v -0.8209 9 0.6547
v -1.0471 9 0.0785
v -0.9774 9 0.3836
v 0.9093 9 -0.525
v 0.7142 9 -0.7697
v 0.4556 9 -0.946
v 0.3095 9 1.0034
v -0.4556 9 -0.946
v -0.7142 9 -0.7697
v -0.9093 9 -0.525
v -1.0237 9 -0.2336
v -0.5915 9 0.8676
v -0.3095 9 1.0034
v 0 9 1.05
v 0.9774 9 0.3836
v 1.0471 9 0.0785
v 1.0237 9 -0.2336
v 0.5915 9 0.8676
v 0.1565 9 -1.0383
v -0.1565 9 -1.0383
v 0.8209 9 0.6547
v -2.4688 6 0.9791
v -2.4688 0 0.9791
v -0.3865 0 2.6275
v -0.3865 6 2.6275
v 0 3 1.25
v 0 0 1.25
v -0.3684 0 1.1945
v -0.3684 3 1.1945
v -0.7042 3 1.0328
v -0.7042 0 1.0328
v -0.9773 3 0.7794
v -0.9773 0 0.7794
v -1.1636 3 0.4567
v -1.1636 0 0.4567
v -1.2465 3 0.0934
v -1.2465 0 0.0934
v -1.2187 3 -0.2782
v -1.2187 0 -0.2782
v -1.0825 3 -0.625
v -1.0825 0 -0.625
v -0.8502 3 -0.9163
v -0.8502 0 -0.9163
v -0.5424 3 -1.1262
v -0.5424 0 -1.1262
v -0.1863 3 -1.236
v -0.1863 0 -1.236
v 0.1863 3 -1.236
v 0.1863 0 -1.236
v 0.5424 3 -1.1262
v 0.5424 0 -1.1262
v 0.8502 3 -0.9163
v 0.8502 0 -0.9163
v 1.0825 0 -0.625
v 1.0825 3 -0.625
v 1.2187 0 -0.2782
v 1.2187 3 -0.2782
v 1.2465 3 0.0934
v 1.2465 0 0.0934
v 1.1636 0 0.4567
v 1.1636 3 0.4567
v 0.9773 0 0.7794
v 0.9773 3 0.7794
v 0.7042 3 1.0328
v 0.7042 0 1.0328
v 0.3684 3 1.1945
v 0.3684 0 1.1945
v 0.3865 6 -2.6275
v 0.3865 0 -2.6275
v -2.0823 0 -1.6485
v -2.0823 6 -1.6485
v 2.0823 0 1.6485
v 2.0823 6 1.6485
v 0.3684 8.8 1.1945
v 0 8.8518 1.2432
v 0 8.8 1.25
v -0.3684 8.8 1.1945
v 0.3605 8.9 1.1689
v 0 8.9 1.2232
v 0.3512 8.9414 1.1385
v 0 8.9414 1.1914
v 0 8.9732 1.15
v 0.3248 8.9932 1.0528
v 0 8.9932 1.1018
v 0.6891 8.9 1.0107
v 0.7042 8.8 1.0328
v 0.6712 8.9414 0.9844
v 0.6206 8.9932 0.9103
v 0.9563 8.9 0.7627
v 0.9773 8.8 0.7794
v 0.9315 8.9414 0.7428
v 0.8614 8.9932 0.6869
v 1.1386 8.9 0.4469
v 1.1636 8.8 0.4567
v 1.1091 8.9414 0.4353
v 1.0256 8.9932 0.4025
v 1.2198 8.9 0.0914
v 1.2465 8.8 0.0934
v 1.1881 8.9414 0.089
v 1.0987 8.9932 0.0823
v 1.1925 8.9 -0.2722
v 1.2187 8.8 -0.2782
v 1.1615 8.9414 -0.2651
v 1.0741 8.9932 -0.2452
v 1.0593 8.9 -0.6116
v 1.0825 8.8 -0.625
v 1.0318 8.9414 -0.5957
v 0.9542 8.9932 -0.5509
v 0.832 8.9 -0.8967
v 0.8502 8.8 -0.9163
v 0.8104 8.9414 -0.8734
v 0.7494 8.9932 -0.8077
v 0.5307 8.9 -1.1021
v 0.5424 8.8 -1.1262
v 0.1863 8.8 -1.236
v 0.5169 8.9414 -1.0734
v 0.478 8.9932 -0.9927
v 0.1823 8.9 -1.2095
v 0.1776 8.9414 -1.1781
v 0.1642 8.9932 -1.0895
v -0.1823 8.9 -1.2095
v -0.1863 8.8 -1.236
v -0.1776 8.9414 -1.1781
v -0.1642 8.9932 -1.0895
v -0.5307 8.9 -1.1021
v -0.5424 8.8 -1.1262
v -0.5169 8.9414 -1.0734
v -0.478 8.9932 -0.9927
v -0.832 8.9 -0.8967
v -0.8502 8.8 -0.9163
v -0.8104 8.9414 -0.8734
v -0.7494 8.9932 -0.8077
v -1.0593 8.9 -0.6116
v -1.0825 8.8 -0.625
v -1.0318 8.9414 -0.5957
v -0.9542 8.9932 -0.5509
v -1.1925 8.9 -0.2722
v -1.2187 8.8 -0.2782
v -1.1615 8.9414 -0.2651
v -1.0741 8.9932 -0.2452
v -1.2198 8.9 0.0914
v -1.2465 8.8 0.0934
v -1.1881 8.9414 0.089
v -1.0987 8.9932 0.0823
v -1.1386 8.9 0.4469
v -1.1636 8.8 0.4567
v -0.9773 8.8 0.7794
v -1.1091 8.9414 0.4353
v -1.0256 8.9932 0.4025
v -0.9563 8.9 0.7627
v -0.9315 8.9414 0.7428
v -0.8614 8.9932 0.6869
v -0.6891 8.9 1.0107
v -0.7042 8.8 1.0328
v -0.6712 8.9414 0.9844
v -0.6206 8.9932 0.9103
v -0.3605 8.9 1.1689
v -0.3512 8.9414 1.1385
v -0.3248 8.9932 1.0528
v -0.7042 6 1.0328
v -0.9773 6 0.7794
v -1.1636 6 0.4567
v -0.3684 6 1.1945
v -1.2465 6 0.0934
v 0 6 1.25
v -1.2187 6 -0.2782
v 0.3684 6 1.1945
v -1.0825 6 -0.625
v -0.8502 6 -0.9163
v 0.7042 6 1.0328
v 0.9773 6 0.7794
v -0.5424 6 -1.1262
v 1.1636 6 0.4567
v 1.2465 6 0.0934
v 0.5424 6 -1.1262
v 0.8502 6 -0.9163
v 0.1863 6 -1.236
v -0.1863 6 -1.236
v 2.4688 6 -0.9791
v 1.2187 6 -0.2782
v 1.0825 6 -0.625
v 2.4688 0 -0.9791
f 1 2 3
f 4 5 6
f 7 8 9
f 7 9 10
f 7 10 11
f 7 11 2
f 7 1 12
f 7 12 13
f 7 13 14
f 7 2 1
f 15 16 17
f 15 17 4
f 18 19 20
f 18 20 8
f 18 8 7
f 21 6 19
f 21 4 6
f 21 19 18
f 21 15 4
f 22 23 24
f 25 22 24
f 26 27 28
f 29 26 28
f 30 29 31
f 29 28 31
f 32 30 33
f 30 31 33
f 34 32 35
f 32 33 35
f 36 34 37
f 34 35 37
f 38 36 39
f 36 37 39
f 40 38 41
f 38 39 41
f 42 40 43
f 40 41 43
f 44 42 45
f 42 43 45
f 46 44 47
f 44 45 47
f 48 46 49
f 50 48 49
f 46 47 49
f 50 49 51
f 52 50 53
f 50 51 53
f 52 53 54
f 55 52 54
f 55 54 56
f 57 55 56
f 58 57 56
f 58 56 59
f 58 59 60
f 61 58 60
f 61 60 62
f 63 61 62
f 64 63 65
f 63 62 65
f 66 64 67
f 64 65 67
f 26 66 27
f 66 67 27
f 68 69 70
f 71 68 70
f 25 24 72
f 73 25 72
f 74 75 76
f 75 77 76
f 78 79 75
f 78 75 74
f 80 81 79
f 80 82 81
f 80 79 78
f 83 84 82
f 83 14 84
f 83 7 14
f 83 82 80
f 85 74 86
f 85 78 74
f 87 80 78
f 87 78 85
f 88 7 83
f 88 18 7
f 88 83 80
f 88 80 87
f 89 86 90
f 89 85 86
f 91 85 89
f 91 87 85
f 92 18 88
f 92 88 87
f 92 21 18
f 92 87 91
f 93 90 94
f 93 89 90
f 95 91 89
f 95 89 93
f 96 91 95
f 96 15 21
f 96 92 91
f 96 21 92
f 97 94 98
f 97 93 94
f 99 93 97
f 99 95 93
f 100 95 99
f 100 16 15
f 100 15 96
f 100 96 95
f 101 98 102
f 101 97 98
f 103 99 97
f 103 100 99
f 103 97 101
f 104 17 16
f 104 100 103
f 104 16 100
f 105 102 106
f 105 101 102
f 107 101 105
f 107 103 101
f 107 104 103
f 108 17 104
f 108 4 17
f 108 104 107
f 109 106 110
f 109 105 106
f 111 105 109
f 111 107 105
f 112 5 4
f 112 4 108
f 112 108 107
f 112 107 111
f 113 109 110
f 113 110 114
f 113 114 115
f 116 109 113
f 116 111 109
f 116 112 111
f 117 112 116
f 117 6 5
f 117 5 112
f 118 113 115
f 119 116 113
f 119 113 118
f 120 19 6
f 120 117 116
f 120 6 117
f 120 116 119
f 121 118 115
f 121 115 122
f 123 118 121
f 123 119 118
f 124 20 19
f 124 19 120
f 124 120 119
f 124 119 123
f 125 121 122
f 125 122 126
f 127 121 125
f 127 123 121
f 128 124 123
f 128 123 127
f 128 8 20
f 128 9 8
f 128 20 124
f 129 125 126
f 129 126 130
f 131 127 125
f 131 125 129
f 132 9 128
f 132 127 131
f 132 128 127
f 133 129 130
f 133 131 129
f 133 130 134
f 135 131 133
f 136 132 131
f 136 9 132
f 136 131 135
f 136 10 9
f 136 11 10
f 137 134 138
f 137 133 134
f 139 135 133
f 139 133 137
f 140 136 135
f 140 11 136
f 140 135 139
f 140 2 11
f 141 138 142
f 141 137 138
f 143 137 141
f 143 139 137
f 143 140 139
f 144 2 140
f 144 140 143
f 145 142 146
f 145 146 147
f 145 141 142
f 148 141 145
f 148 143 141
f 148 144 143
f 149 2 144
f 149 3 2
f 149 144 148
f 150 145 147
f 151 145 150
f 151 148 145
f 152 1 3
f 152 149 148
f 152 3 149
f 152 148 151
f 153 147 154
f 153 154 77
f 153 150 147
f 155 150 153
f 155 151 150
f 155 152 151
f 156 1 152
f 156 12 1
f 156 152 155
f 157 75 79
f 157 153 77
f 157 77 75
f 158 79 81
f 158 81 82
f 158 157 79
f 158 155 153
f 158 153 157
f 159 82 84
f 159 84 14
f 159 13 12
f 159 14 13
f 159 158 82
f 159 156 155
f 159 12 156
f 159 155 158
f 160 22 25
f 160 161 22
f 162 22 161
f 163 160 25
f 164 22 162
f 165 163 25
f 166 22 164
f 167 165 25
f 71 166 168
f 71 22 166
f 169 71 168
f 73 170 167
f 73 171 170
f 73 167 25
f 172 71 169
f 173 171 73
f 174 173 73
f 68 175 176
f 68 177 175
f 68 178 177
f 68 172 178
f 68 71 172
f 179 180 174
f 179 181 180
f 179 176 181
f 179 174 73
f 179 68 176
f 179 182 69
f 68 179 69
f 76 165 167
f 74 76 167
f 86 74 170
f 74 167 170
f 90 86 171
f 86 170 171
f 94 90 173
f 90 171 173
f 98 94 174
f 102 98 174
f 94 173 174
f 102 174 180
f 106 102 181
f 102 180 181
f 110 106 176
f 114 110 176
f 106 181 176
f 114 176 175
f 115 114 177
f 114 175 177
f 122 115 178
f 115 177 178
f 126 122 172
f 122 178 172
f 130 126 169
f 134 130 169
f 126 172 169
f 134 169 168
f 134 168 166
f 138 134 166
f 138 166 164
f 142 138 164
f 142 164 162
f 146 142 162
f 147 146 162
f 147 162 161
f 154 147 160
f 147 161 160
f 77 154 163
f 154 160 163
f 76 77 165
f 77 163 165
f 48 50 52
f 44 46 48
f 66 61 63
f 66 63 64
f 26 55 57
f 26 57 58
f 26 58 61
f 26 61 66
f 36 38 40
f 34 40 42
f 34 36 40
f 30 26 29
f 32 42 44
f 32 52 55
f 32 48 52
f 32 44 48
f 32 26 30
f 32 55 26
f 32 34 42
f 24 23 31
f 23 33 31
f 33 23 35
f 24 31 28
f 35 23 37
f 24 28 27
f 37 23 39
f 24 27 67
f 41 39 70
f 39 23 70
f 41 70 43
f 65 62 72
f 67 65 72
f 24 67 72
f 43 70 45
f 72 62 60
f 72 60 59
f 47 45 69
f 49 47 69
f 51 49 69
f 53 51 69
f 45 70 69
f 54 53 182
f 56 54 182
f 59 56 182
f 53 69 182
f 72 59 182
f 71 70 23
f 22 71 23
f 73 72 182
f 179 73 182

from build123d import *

# Parameters (mm, degrees)
SALIENTE_EXTRUIR1_DEPTH = 6
CROQUIS_CARA_R          = 1.25
SALIENTE_EXTRUIR2_DEPTH = 3
REDONDEO1_R             = 0.2
CROQUIS1_R              = 1.25
CORTAR_EXTRUIR1_DEPTH   = 3


with BuildPart() as part:
    # Croquis base → Saliente-Extruir1 (new body)
    with BuildSketch(Plane(origin=(0, 0, 0), x_dir=(1, 0, 0), z_dir=(0, 1, 0))):
        Polygon((2.082277712, -1.648469855), (2.468755628, 0.979070469), (0.386477916, 2.627540324), (-2.082277712, 1.648469855), (-2.468755628, -0.979070469), (-0.386477916, -2.627540324), align=None)
    extrude(amount=SALIENTE_EXTRUIR1_DEPTH)

    # Croquis cara → Saliente-Extruir2 (add)
    with BuildSketch(Plane(origin=(0, 6, 0), x_dir=(1, 0, 0), z_dir=(0, 1, 0))):
        with Locations(Location((0, 0, 0), (0, 0, 270))):
            Circle(CROQUIS_CARA_R)
    extrude(amount=SALIENTE_EXTRUIR2_DEPTH)

    # Redondeo1
    redondeo1_edges = [part.edges().sort_by_distance(p)[0] for p in [
        (0, 9, -1.25),
    ]]
    fillet(redondeo1_edges, radius=REDONDEO1_R)

    # Croquis1 → Cortar-Extruir1 (cut)
    with BuildSketch(Plane.XZ):
        with Locations(Location((0, 0, 0), (0, 0, 90))):
            Circle(CROQUIS1_R)
    extrude(amount=-CORTAR_EXTRUIR1_DEPTH, mode=Mode.SUBTRACT)


solid = part.part
